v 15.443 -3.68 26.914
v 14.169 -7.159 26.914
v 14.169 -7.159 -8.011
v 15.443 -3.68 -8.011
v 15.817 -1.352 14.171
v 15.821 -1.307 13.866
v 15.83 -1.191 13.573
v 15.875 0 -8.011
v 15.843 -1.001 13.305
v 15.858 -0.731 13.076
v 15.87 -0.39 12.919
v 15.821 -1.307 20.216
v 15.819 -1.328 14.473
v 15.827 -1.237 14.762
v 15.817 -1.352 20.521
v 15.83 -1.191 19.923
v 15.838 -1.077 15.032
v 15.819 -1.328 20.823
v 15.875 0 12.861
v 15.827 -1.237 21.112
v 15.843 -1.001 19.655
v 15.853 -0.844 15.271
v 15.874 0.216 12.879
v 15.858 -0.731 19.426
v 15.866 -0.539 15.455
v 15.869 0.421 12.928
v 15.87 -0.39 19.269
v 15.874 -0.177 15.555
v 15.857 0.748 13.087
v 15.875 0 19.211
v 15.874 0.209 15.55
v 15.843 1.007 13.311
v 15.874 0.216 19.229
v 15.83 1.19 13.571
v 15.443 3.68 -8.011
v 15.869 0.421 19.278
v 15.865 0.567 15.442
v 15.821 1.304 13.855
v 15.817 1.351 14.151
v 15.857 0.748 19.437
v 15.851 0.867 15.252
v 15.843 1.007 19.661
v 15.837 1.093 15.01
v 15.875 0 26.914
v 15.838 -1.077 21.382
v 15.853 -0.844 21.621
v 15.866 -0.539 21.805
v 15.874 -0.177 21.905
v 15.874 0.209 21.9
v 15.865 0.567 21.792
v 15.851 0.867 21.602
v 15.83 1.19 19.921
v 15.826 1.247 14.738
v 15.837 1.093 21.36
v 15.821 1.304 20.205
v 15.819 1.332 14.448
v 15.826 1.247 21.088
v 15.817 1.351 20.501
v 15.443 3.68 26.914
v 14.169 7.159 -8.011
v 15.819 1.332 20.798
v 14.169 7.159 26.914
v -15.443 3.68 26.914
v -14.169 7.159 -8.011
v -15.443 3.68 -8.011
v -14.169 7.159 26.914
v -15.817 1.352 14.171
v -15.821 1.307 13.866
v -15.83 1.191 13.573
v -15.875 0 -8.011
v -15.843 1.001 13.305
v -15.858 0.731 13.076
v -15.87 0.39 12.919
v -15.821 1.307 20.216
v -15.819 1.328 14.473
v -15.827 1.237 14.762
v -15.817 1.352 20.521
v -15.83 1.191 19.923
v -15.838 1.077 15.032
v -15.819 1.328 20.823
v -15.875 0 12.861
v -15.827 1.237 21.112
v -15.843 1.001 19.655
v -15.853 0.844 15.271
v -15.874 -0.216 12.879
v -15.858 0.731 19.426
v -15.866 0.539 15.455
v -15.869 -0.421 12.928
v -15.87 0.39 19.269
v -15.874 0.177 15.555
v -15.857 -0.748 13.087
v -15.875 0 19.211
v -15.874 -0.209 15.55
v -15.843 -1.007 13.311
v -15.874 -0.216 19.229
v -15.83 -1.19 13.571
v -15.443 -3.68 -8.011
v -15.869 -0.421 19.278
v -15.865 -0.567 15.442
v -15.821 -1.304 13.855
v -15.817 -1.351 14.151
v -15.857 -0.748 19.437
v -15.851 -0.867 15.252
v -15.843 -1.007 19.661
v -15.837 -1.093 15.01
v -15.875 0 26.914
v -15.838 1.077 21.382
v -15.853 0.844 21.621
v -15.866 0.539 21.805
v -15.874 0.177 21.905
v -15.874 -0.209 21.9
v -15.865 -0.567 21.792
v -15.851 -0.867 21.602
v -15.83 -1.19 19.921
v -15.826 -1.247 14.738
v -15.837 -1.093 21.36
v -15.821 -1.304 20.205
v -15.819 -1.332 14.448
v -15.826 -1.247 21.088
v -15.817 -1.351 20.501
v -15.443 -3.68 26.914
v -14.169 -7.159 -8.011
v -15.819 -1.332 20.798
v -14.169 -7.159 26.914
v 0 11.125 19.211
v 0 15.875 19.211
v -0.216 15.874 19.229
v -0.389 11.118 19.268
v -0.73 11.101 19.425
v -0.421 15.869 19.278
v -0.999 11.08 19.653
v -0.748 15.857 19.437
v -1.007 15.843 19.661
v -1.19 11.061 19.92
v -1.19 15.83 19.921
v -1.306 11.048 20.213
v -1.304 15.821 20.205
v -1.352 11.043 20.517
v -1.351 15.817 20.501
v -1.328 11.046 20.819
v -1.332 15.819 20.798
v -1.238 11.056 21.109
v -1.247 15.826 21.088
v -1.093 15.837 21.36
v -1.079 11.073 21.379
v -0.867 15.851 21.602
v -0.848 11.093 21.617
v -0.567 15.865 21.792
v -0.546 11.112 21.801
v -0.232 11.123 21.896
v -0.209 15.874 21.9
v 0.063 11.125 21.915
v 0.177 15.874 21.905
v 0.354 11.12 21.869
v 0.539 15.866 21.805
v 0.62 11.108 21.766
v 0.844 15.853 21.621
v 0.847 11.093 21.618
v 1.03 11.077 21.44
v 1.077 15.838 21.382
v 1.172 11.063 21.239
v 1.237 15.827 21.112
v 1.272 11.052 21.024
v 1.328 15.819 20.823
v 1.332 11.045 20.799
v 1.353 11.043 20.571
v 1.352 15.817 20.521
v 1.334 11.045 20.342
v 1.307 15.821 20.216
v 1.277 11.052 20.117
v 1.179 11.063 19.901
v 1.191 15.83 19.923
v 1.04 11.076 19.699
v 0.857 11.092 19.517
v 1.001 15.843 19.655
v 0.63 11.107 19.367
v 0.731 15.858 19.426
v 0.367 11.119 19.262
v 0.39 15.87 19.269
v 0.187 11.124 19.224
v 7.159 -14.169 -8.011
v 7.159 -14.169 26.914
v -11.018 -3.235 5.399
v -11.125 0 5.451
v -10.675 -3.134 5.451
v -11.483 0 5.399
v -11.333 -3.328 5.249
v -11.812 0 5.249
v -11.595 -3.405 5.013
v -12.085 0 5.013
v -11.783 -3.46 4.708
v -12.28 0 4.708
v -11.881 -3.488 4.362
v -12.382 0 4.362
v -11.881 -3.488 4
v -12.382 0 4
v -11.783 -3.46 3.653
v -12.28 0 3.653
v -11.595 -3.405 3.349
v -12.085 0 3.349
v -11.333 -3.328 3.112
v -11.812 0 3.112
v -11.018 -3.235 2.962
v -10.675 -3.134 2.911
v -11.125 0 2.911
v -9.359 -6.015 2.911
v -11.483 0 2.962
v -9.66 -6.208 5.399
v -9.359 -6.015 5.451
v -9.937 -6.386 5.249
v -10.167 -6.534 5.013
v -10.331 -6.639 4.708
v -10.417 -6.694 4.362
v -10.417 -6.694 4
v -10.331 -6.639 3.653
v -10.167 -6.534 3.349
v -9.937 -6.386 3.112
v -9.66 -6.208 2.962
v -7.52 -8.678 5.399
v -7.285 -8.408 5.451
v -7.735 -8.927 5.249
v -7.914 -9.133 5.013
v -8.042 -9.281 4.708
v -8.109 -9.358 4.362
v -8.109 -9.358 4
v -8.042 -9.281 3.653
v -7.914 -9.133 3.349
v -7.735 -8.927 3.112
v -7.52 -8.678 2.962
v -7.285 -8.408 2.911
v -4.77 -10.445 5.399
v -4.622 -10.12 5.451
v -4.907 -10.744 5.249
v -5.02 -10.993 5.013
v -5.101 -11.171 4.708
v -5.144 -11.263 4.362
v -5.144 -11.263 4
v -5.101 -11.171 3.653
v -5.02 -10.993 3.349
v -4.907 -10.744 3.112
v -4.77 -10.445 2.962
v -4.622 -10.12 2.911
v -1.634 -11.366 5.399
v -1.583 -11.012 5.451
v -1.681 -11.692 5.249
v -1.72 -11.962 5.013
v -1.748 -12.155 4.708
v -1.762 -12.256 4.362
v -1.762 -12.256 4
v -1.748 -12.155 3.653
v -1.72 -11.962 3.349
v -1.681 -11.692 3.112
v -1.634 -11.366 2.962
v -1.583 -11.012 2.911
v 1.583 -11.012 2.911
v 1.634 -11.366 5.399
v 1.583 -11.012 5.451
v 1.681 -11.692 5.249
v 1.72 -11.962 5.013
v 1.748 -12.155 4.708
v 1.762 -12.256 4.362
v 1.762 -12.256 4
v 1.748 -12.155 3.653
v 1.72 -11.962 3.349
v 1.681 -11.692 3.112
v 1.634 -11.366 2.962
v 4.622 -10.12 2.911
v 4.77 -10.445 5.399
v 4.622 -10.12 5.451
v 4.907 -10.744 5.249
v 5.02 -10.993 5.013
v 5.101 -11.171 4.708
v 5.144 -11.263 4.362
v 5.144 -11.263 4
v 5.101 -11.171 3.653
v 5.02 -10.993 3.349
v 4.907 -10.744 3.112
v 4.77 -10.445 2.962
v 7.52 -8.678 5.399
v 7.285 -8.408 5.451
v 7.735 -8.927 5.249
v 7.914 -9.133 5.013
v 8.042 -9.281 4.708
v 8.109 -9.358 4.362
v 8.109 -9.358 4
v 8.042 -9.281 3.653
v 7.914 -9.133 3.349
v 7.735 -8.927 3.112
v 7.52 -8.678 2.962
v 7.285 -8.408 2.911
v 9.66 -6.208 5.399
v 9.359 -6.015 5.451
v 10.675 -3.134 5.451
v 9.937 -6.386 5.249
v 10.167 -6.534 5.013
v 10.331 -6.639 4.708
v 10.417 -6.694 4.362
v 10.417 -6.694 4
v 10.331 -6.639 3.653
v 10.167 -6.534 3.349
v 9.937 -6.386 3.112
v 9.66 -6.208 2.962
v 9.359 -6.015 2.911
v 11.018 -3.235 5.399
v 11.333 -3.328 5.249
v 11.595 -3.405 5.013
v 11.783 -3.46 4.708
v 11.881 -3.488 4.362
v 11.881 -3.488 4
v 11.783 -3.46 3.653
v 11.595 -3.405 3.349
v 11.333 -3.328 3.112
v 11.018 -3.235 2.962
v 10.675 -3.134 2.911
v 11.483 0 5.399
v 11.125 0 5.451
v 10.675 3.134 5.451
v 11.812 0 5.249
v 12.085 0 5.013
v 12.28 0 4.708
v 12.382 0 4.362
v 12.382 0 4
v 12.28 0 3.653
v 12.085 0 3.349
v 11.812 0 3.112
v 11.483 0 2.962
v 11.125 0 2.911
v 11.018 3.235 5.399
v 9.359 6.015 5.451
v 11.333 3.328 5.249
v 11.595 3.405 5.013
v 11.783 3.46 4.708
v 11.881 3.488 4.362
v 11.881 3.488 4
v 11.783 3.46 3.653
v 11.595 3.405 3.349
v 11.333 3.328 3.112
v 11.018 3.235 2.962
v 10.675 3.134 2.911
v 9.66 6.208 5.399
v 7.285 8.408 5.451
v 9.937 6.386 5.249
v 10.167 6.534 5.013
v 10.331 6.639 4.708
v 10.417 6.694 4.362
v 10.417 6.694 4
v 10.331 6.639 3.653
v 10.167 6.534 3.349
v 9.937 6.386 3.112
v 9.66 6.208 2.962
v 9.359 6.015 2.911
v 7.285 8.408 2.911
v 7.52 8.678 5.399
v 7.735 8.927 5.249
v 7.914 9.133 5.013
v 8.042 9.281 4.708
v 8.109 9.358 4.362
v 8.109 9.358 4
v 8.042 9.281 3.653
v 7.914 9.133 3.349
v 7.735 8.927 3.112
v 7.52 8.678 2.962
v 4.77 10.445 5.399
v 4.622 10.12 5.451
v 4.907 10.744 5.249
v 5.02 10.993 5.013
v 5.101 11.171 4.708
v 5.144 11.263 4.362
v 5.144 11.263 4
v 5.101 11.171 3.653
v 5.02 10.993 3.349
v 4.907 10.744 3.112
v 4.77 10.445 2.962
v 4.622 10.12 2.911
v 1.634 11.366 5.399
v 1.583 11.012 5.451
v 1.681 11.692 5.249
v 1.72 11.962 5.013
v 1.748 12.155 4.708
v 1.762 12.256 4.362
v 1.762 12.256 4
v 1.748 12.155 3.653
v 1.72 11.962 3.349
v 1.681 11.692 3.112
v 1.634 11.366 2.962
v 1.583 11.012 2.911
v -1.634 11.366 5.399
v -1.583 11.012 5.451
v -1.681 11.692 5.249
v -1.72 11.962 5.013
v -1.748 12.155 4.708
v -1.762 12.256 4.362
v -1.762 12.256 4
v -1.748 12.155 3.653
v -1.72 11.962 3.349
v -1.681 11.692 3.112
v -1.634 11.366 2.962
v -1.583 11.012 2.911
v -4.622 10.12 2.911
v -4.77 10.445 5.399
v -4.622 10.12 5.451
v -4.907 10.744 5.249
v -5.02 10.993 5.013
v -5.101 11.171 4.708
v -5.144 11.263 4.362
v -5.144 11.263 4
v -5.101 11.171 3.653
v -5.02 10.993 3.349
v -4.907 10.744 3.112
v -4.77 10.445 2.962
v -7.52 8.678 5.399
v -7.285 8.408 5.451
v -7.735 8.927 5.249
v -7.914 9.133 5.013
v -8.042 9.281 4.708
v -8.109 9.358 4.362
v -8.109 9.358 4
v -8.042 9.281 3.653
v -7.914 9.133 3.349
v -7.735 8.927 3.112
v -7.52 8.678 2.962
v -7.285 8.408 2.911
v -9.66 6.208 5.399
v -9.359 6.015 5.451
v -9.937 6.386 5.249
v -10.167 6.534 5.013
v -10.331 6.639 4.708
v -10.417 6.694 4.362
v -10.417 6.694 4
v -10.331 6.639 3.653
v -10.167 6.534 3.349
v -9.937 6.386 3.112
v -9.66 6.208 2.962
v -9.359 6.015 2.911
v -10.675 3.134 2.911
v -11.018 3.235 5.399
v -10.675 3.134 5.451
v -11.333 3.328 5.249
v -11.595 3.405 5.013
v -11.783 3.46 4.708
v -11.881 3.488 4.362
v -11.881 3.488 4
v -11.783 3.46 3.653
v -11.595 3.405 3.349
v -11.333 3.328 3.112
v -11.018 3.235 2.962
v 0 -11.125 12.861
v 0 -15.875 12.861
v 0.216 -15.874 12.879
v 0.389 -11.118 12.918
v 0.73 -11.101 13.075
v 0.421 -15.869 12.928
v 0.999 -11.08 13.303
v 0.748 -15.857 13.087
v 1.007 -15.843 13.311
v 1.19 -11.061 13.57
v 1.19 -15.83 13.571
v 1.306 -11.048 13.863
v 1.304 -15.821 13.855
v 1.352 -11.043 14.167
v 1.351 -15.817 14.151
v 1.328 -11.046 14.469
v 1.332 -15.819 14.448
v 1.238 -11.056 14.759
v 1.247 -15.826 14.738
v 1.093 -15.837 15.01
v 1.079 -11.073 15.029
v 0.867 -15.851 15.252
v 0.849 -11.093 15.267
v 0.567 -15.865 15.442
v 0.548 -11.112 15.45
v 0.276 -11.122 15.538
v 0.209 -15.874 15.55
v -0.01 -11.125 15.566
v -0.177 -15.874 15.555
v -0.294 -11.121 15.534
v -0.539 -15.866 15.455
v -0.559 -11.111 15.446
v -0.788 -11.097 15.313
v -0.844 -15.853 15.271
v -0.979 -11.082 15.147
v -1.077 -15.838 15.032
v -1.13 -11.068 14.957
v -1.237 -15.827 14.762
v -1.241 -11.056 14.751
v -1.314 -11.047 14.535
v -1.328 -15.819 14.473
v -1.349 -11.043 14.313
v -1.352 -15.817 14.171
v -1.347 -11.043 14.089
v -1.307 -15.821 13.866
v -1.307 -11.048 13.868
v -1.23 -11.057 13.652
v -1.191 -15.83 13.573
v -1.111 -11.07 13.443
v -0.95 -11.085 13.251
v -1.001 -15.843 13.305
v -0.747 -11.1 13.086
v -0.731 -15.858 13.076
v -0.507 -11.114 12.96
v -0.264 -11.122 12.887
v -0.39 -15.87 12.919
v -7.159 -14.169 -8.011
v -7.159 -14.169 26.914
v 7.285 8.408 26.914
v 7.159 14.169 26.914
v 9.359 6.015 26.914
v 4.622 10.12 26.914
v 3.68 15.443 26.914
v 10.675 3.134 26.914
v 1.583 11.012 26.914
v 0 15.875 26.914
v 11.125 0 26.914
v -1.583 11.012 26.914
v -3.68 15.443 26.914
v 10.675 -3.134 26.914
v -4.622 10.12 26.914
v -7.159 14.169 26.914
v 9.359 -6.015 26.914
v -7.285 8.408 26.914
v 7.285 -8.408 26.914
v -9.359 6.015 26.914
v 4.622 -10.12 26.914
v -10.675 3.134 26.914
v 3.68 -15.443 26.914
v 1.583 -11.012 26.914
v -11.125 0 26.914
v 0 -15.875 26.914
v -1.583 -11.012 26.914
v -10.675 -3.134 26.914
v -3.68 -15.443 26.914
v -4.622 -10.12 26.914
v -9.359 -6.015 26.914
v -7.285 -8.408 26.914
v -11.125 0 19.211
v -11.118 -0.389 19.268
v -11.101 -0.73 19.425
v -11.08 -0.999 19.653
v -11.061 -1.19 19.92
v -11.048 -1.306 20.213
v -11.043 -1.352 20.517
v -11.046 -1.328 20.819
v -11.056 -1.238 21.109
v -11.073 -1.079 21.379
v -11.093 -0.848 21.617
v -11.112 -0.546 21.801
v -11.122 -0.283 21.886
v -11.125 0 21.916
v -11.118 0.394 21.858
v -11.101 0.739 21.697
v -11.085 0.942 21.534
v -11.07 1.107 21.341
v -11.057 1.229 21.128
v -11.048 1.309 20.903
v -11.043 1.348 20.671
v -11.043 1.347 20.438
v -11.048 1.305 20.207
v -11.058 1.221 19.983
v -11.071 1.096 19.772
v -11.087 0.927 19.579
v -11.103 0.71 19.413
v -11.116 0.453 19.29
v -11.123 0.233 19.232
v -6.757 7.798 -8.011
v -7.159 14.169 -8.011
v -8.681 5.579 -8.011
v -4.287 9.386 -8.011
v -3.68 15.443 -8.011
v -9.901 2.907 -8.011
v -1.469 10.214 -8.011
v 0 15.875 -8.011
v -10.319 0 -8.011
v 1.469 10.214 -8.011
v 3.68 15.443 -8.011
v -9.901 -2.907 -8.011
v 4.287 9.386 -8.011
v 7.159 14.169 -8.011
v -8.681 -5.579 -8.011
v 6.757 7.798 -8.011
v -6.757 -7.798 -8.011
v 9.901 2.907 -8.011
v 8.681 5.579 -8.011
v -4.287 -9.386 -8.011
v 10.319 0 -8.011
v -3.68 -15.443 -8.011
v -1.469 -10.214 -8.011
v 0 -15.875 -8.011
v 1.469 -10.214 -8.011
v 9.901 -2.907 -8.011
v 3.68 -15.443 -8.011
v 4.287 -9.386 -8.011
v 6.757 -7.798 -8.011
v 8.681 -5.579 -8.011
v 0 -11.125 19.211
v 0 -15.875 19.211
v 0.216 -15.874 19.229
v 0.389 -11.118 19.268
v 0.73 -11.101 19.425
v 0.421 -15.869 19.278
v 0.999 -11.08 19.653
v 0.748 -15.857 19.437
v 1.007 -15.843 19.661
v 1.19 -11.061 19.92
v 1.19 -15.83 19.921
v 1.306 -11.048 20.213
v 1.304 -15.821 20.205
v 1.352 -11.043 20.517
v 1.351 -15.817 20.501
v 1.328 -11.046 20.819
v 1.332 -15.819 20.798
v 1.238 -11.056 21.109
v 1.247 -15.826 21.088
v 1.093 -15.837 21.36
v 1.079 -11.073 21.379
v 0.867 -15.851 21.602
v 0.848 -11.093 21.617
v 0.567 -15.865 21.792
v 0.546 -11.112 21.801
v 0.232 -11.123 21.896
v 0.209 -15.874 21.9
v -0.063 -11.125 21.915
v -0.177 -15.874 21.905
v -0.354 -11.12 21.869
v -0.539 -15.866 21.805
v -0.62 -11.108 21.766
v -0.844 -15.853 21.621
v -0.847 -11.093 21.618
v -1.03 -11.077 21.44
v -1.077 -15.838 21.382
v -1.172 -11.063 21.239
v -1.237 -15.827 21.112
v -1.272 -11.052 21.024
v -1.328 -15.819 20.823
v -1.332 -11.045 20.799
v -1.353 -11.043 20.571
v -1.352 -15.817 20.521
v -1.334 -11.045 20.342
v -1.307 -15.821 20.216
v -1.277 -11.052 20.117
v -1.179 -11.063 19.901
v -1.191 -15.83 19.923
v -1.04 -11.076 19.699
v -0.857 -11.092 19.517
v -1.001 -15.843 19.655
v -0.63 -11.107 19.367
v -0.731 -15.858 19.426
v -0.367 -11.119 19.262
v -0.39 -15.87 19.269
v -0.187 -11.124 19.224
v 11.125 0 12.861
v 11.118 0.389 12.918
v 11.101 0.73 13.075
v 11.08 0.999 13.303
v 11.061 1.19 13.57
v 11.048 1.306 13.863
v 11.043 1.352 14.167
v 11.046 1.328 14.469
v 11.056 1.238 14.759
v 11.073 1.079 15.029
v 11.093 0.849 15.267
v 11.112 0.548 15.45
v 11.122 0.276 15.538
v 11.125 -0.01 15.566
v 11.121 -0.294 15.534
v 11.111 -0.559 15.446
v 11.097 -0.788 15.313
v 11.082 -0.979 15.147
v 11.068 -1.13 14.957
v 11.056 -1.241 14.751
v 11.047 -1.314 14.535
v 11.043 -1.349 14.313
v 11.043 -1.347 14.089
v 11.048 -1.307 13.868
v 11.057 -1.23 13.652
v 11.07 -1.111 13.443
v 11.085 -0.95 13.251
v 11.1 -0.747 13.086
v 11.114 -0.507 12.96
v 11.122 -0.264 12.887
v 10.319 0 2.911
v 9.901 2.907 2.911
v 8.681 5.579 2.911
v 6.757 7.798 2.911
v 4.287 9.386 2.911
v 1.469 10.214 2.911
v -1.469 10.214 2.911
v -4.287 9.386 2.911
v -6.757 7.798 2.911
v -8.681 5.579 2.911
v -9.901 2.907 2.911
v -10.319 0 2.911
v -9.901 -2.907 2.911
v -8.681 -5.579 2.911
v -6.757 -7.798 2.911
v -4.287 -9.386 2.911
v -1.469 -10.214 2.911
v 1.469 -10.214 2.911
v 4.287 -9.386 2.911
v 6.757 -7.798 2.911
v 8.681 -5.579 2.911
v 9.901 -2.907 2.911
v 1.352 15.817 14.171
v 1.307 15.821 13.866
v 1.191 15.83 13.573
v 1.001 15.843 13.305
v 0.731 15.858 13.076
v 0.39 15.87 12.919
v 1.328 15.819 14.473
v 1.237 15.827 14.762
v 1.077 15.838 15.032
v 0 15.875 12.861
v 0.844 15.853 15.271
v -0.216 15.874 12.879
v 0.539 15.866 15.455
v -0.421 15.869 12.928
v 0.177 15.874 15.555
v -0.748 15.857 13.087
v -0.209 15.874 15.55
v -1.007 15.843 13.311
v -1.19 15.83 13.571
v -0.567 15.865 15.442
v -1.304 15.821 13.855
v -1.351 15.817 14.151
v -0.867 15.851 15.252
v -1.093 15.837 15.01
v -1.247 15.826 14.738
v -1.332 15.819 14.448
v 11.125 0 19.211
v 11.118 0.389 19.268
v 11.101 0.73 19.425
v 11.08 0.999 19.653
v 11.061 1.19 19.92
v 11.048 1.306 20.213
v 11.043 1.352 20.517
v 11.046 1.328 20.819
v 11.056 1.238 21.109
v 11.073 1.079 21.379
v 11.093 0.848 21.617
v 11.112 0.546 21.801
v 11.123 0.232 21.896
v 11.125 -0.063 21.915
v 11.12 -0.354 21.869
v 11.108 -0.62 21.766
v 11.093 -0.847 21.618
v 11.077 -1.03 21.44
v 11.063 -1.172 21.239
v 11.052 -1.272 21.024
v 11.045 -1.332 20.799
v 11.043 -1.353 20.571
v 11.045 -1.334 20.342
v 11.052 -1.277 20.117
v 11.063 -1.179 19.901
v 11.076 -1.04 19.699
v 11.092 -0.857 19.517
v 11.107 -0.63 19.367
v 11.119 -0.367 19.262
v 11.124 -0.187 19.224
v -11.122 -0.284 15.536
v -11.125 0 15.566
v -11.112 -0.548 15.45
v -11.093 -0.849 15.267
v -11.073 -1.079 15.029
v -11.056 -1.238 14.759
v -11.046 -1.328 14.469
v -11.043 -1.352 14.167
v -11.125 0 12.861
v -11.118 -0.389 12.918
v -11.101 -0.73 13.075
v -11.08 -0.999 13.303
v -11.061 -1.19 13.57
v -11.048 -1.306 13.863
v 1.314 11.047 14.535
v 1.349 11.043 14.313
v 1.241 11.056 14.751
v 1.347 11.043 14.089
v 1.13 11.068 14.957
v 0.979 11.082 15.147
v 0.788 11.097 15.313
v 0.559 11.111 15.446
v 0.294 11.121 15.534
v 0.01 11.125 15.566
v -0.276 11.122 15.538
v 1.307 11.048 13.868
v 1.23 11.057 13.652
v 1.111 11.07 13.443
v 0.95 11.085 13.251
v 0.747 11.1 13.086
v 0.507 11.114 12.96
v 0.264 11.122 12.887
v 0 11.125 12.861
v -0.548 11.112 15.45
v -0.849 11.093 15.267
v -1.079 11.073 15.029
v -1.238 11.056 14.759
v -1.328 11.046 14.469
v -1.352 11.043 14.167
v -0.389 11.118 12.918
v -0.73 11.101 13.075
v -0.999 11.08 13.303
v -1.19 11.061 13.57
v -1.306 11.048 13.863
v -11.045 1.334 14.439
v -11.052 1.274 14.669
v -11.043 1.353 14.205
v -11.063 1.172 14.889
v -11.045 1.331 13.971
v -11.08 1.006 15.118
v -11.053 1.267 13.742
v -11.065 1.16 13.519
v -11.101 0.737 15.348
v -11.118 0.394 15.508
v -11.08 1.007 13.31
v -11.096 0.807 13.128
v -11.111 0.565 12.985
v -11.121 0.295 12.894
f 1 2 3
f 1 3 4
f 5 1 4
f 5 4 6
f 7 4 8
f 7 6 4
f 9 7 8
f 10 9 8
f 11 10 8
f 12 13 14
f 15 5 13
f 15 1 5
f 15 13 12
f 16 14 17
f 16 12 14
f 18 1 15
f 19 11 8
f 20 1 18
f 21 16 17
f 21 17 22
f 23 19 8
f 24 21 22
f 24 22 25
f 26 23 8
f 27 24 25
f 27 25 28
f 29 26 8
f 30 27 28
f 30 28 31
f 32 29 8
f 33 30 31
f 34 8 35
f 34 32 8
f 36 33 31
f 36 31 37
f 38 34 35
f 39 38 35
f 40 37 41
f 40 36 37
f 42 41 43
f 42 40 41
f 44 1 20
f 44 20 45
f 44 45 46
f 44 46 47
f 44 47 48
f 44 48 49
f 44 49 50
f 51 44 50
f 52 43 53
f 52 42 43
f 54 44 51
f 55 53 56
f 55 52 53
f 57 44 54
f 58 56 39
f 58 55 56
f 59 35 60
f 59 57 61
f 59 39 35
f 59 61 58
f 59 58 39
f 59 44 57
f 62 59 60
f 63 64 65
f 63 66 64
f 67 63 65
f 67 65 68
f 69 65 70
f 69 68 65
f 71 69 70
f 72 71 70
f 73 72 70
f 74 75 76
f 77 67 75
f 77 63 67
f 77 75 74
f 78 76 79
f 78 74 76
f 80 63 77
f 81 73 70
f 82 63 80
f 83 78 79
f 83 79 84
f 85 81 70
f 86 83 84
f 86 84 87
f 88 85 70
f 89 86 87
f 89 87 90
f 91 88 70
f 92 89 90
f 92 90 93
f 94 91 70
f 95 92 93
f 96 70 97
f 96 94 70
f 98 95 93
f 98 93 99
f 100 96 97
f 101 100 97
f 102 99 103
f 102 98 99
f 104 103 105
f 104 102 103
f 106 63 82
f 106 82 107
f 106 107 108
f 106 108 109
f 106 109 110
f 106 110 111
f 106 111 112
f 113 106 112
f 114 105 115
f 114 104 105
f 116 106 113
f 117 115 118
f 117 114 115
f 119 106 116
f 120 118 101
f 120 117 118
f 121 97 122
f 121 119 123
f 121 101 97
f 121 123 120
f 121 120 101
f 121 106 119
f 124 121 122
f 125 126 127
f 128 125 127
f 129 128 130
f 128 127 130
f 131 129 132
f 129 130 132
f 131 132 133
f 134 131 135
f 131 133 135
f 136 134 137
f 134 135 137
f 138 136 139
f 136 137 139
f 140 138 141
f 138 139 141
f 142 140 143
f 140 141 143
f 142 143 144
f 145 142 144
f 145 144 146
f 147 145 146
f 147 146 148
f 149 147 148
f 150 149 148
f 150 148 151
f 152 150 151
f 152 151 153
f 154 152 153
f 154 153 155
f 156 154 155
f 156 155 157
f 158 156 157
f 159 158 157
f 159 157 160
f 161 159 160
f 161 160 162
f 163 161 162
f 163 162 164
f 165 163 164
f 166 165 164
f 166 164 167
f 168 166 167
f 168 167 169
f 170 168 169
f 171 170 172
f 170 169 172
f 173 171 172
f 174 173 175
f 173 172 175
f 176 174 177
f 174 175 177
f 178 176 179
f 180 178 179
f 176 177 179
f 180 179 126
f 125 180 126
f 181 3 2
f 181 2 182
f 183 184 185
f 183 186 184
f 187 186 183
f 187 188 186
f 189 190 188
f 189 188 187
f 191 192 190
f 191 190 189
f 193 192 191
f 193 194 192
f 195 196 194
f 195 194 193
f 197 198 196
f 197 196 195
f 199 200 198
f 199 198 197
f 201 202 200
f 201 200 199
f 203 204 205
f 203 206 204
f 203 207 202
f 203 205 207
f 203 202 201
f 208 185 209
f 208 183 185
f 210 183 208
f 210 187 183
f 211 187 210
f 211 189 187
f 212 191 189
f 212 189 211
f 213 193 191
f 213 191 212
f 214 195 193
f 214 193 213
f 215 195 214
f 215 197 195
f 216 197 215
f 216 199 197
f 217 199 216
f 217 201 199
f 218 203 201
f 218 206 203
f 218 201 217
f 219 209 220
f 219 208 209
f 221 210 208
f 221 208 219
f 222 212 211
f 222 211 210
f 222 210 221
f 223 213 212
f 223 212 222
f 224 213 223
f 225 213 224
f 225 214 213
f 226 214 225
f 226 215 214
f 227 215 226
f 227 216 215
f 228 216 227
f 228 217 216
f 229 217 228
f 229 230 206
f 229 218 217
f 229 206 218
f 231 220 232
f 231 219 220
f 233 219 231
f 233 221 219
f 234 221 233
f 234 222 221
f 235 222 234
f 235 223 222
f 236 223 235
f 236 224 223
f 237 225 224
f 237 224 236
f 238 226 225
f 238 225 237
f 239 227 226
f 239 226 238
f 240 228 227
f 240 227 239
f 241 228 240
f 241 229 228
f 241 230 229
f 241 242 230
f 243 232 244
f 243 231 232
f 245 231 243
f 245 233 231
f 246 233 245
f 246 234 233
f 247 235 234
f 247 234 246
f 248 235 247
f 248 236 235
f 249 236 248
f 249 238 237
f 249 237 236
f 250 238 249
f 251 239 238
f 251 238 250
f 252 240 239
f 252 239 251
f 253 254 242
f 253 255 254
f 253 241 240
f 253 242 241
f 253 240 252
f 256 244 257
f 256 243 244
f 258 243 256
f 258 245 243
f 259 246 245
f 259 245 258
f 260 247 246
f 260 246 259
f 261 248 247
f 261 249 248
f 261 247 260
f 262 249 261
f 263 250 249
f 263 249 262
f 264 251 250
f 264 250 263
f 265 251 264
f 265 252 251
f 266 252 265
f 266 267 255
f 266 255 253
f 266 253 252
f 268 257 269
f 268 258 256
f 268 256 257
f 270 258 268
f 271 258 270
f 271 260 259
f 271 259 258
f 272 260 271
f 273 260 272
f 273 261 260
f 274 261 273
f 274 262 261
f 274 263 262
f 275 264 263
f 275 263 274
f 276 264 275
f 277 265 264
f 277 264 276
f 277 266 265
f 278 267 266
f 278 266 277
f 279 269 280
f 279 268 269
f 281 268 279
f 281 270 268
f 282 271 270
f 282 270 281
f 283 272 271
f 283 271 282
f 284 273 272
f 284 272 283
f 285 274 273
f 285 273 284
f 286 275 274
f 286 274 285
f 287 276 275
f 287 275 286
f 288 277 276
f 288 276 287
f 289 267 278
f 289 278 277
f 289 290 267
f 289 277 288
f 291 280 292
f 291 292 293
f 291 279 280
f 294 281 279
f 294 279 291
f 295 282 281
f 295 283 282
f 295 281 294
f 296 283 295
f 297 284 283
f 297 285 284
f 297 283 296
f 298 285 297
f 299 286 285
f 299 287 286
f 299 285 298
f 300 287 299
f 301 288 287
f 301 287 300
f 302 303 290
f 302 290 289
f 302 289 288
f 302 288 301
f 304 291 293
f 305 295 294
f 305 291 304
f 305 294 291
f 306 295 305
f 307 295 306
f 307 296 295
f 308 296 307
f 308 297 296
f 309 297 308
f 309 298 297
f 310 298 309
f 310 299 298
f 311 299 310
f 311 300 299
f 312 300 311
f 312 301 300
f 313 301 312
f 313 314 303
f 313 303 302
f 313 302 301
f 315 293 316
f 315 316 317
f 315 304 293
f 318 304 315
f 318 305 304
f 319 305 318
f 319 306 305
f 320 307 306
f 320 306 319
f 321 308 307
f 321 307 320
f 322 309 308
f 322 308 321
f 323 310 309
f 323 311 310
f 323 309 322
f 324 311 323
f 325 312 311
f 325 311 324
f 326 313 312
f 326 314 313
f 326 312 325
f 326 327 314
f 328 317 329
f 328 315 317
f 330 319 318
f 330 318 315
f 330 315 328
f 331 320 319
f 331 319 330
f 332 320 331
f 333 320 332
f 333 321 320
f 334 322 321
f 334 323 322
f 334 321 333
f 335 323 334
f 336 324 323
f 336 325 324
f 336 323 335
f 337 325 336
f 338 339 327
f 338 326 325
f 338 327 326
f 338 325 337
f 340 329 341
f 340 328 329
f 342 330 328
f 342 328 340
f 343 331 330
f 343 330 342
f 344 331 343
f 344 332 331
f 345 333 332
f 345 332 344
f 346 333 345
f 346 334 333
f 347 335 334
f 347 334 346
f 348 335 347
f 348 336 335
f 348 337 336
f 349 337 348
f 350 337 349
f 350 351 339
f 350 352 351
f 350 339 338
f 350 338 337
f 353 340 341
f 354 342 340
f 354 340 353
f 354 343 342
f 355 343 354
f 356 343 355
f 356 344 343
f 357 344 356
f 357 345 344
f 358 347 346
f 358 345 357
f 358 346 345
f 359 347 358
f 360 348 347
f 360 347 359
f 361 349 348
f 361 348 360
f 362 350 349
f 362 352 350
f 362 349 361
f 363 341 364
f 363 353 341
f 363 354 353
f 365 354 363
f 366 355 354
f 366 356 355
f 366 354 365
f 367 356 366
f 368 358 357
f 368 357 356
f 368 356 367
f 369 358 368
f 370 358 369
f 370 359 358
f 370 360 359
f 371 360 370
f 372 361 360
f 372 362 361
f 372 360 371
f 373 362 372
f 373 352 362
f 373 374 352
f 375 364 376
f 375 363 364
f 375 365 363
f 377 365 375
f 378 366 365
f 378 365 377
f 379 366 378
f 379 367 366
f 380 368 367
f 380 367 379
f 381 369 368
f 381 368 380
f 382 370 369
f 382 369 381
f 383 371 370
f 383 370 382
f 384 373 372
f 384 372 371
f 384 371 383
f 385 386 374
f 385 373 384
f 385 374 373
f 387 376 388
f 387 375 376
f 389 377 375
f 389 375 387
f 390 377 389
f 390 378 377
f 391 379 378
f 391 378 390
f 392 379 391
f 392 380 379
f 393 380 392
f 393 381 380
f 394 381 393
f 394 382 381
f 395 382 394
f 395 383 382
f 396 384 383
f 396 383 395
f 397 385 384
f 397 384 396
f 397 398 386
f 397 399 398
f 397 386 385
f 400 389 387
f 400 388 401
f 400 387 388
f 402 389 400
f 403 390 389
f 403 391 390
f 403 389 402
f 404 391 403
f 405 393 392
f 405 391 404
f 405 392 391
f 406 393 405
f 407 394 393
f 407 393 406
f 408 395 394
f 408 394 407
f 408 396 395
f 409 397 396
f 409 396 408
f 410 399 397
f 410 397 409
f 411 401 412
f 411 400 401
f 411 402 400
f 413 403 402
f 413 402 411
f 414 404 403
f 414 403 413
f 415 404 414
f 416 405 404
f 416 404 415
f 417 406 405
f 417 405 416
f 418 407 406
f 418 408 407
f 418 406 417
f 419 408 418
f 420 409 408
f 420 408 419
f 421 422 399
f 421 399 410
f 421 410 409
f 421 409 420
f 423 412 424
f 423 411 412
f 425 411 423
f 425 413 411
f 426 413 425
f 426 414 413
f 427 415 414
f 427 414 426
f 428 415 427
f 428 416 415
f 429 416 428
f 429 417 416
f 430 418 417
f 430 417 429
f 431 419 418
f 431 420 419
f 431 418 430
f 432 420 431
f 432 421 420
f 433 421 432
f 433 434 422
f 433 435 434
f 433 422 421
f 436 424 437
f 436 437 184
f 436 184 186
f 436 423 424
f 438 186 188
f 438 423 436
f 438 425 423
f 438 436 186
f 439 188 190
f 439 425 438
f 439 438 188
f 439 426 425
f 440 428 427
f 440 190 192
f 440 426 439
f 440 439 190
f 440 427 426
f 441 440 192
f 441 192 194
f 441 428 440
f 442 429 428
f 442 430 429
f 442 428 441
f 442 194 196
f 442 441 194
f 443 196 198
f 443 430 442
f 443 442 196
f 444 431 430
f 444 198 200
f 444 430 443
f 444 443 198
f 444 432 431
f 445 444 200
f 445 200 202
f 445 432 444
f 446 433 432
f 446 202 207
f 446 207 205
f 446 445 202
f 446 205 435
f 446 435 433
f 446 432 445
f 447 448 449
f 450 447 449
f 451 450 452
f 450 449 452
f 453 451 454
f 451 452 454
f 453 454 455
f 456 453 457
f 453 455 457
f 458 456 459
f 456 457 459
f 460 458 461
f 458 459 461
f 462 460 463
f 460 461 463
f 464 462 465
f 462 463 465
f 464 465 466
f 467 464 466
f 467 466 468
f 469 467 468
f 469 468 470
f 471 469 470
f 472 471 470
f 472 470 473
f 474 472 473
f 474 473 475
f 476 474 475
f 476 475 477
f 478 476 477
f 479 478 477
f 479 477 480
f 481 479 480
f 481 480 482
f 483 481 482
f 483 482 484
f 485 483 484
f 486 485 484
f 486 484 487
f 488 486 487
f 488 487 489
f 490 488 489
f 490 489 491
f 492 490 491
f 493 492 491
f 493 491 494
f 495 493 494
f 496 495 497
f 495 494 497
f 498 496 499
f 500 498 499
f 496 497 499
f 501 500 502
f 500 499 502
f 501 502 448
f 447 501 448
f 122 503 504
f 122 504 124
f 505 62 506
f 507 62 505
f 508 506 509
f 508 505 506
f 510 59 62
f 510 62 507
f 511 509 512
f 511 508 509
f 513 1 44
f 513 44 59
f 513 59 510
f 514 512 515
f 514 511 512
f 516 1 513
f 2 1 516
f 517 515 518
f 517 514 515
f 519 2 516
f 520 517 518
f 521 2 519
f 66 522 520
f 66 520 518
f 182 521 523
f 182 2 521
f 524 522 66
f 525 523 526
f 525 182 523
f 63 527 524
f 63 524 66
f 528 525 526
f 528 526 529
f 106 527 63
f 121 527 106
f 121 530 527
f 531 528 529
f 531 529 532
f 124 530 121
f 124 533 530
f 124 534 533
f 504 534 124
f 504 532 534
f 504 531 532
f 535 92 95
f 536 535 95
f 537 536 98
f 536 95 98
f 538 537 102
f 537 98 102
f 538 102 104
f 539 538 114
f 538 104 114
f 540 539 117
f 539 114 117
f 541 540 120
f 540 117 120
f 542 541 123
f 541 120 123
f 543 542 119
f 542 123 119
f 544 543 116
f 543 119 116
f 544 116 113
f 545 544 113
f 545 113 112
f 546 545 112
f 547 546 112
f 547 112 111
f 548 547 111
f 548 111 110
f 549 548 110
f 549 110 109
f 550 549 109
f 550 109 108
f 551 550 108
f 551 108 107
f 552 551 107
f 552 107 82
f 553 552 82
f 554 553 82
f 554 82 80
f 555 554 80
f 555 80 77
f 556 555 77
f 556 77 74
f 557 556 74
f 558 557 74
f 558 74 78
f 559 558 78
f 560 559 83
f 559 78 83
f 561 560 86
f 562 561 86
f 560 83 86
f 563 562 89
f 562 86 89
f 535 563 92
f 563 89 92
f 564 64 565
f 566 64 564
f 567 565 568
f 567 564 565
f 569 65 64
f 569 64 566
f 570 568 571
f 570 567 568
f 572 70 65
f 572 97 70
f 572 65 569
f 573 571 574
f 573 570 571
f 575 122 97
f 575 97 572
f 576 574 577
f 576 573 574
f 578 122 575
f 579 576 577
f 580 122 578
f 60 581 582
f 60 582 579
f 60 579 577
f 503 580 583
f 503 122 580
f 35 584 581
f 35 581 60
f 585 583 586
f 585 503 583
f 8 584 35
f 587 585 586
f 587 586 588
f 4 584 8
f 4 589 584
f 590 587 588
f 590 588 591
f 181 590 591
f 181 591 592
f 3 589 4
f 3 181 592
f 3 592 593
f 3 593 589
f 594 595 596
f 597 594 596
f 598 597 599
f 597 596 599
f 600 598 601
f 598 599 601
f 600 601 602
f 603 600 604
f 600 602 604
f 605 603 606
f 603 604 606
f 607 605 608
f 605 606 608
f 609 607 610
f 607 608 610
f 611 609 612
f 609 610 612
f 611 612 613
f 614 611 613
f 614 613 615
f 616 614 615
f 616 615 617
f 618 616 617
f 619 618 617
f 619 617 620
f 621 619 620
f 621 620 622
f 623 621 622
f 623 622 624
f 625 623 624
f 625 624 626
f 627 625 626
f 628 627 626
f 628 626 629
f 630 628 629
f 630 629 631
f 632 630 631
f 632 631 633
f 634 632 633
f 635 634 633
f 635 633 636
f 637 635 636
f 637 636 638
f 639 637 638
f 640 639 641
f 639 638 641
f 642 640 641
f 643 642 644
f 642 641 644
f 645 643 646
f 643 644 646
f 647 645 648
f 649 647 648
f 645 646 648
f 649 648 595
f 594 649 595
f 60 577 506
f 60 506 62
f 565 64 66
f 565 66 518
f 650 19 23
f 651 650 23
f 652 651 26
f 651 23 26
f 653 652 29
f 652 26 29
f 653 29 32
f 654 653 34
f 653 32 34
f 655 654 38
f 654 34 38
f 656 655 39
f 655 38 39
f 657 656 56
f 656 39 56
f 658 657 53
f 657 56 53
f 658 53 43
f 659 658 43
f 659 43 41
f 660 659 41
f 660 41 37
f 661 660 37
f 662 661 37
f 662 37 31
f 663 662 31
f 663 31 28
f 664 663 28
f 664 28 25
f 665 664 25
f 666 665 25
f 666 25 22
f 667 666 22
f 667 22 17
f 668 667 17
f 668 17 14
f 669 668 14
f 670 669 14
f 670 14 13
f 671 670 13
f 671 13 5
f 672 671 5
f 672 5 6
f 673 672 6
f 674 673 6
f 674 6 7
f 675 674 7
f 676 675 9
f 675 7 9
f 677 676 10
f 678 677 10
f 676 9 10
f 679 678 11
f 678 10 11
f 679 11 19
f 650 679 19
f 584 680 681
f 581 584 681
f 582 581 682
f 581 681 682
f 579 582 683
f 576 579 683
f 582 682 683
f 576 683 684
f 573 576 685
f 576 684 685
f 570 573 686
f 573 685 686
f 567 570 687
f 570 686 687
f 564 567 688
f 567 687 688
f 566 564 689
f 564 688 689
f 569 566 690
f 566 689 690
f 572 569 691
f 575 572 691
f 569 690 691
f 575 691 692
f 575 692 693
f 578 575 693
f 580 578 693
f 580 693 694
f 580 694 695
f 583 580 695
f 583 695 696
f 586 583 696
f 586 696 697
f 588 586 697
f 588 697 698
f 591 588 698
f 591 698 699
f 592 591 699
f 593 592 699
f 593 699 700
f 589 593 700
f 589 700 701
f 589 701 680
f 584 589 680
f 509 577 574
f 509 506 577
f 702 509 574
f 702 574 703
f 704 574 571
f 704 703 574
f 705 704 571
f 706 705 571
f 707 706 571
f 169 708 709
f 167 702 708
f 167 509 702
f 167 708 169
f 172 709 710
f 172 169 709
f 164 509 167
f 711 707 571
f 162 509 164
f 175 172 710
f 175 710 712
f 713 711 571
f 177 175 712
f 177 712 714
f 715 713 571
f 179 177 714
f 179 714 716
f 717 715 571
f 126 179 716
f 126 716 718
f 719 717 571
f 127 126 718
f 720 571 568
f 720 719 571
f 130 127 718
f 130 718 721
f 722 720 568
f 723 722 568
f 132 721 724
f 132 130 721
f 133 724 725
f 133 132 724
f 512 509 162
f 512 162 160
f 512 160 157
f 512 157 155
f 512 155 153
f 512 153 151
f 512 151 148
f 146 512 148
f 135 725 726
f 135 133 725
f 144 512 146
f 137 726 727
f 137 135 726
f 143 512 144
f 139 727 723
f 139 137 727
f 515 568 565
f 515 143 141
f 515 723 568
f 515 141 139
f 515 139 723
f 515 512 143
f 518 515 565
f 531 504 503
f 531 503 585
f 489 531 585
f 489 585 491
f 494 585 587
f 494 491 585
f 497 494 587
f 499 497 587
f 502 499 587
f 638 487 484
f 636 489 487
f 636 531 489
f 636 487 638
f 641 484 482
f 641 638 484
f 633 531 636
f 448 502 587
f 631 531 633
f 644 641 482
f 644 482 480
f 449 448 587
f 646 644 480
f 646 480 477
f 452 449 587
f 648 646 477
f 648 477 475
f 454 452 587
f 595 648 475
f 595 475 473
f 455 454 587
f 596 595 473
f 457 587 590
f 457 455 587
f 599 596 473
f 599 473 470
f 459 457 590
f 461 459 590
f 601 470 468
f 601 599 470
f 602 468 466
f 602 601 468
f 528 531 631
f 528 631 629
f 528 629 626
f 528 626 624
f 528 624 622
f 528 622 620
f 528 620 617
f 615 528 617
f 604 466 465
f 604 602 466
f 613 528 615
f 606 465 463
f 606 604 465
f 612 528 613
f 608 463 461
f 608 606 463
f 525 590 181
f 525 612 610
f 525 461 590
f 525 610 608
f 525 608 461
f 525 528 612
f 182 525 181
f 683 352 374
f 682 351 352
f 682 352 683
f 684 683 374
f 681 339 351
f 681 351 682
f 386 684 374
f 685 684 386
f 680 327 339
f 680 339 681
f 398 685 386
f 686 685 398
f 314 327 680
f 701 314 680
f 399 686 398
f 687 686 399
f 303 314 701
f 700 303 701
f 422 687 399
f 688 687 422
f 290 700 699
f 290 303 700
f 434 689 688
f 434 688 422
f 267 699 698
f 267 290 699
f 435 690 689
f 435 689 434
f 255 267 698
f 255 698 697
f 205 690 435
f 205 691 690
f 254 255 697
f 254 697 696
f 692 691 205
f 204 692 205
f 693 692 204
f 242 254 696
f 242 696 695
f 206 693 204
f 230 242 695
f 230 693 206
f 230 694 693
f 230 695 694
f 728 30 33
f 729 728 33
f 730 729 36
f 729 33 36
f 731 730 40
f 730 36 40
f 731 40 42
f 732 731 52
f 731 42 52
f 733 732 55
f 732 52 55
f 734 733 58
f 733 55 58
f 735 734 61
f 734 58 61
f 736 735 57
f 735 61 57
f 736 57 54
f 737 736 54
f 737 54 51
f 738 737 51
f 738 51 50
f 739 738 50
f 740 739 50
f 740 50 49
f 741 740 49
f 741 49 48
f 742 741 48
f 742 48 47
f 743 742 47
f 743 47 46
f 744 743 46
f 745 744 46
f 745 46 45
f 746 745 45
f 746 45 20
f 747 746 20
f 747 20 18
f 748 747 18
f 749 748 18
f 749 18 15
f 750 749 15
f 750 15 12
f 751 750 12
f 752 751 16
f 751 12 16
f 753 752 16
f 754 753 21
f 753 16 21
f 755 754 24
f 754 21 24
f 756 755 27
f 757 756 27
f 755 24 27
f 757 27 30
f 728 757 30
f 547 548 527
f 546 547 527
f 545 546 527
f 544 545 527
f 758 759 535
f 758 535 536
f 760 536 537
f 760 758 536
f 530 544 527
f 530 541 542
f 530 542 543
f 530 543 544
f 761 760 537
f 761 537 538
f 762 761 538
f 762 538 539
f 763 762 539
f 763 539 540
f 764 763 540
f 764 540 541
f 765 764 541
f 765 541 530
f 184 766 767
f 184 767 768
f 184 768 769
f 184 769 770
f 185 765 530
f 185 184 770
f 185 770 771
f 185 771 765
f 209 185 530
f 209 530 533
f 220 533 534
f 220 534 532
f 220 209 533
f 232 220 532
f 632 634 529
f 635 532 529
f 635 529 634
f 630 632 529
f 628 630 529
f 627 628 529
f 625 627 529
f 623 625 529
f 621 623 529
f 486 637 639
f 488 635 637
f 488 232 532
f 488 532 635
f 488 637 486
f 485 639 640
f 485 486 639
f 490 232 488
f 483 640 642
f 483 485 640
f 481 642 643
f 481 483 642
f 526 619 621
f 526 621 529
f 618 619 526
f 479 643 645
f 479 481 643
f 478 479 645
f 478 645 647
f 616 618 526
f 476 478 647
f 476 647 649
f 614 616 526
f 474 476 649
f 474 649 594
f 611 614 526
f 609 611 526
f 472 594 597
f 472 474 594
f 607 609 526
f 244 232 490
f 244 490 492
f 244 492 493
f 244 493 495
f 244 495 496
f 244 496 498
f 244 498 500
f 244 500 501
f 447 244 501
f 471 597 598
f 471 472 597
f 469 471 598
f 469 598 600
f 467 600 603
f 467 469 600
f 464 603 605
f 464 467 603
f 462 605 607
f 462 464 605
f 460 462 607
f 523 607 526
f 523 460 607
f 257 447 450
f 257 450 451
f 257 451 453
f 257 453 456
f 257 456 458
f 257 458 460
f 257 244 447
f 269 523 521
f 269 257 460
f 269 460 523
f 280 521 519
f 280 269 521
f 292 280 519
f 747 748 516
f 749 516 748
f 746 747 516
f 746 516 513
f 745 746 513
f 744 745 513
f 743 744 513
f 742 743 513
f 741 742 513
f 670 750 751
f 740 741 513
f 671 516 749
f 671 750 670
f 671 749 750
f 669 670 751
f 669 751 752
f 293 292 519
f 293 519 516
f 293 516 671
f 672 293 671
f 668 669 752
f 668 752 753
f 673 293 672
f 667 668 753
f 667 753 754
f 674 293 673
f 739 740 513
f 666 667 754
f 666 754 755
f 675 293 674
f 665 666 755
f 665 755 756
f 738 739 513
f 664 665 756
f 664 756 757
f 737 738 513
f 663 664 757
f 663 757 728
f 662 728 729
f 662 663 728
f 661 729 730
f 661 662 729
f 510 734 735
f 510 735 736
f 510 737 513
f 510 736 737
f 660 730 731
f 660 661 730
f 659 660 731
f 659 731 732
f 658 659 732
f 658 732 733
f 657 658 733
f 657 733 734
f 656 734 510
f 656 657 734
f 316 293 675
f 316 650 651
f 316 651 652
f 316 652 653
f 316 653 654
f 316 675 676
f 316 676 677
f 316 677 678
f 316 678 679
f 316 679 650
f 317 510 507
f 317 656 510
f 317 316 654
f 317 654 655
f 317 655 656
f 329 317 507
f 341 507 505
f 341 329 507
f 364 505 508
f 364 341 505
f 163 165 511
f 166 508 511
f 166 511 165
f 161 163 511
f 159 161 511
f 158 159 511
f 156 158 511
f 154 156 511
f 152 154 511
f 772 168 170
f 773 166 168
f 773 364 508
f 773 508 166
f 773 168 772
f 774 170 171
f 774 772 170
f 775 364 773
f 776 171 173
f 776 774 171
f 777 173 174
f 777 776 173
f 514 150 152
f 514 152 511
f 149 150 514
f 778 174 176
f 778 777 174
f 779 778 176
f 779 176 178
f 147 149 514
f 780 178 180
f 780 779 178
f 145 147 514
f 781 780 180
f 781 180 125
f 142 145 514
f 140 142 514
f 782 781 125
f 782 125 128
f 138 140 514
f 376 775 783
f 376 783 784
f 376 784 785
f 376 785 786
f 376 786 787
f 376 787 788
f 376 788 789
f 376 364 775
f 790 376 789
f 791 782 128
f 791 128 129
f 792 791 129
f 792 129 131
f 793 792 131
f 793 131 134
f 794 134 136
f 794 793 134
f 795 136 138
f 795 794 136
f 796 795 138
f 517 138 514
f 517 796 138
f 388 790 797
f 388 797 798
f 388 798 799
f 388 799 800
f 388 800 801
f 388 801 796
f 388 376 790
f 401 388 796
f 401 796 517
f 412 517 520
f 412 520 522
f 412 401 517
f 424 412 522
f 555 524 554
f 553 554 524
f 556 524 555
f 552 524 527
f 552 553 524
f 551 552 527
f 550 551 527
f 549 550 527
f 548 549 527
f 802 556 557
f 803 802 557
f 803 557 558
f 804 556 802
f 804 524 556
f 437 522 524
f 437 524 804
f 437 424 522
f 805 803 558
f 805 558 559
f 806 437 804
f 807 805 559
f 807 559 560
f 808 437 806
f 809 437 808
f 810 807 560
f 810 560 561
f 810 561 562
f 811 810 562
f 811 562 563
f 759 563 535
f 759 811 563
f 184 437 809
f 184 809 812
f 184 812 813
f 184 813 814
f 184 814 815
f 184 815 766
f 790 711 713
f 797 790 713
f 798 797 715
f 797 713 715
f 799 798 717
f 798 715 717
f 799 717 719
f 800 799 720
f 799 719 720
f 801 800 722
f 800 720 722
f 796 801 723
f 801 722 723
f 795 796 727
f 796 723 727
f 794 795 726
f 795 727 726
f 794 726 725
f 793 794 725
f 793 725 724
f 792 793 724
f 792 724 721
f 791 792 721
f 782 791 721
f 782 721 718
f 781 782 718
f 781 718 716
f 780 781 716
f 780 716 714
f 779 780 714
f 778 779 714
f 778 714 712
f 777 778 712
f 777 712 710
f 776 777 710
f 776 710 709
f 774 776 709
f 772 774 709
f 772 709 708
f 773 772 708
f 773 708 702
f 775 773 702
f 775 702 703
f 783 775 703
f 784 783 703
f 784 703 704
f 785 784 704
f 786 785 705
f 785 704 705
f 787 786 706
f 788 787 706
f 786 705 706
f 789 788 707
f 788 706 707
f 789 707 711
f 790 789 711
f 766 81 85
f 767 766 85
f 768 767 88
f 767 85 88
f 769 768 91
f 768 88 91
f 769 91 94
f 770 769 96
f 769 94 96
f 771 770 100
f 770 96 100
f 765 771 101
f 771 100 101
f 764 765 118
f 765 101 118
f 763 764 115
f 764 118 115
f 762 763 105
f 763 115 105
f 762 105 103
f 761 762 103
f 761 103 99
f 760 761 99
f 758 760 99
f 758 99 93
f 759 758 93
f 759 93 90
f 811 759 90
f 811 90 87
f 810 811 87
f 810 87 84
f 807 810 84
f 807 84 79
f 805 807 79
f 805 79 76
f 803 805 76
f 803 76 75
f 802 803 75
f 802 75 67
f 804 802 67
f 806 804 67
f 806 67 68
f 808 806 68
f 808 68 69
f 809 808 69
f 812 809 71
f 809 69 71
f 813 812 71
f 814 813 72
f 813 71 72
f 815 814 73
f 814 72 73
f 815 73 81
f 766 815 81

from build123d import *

# Parameters (mm, degrees)
SKETCH2_OUTSIDE_W          = 45.126
SKETCH2_OUTSIDE_H          = 45.126
CUT_EXTRUDE1_DEPTH         = 42.518512437
F_6_32_TAPPED_HOLE1_REACH  = 46.547
F_6_32_TAPPED_HOLE1_BORE_R = 1.35255
CIRPATTERN1_COUNT          = 4
F_7_8_14_TAPPED_HOLE1_D    = 20.6375


with BuildPart() as part:
    # Sketch1 → Revolve1 (revolve)
    with BuildSketch(Plane(origin=(0, 0, 0), x_dir=(0, 0, -1), z_dir=(1, 0, 0)), mode=Mode.PRIVATE) as revolve1_sk:
        with BuildLine():
            Line((-26.913863801, 11.1252), (-5.450863801, 11.1252))
            ThreePointArc((-5.450863801, 11.1252), (-4.180863801, 12.3952), (-2.910863801, 11.1252))
            Line((-2.910863801, 11.1252), (-2.910863801, 9.9695))
            Line((-2.910863801, 9.9695), (8.011136199, 9.9695))
            Line((8.011136199, 9.9695), (8.011136199, 15.875))
            Line((8.011136199, 15.875), (-26.913863801, 15.875))
            Line((-26.913863801, 15.875), (-26.913863801, 11.1252))
        make_face()
    revolve(revolve1_sk.sketch.rotate(Axis((0, 0, 0), (0, 0, 1)), 90), axis=Axis((0, 0, 0), (0, 0, 1)))

    # Sketch2 outside → Cut-Extrude1 (cut, through all)
    with BuildSketch(Plane.XY.offset(26.913863801)):
        Rectangle(SKETCH2_OUTSIDE_W, SKETCH2_OUTSIDE_H)
        Polygon((0, -21.328108288), (-21.328108288, 0), (0, 21.328108288), (21.328108288, 0), align=None, mode=Mode.SUBTRACT)
    extrude(amount=-CUT_EXTRUDE1_DEPTH, mode=Mode.SUBTRACT)

    # 6-32 Tapped Hole1 bore → 6-32 Tapped Hole1 (cut, up to next)
    with BuildSketch(Plane(origin=(15.875, 0, 0), x_dir=(0, 0, -1), z_dir=(1, 0, 0)), mode=Mode.PRIVATE) as f_6_32_tapped_hole1_sk1:
        with Locations((-20.563863801, 0)):
            Circle(F_6_32_TAPPED_HOLE1_BORE_R)
    f_6_32_tapped_hole1_tool1 = extrude(f_6_32_tapped_hole1_sk1.sketch, amount=-F_6_32_TAPPED_HOLE1_REACH, mode=Mode.PRIVATE) & part.part
    # 6-32 Tapped Hole1 bore → 6-32 Tapped Hole1 (cut, up to next)
    with BuildSketch(Plane(origin=(15.875, 0, 0), x_dir=(0, 0, -1), z_dir=(1, 0, 0)), mode=Mode.PRIVATE) as f_6_32_tapped_hole1_sk2:
        with Locations((-14.213863801, 0)):
            Circle(F_6_32_TAPPED_HOLE1_BORE_R)
    f_6_32_tapped_hole1_tool2 = extrude(f_6_32_tapped_hole1_sk2.sketch, amount=-F_6_32_TAPPED_HOLE1_REACH, mode=Mode.PRIVATE) & part.part
    f_6_32_tapped_hole1_1 = f_6_32_tapped_hole1_tool1.solids().sort_by_distance((15.875, 0, 20.563864))[0]
    add(f_6_32_tapped_hole1_1, mode=Mode.SUBTRACT)
    f_6_32_tapped_hole1_2 = f_6_32_tapped_hole1_tool2.solids().sort_by_distance((15.875, 0, 14.213864))[0]
    add(f_6_32_tapped_hole1_2, mode=Mode.SUBTRACT)
    f_6_32_tapped_hole1 = f_6_32_tapped_hole1_1 + f_6_32_tapped_hole1_2  # 6-32 Tapped Hole1 as one shape, for the pattern or mirror that repeats it

    # CirPattern1: 6-32 Tapped Hole1 ×4 about axis
    cirpattern1_axis = Axis((0, 0, 0), (0, 0, -1))
    for i in range(1, CIRPATTERN1_COUNT):
        add(f_6_32_tapped_hole1.rotate(cirpattern1_axis, i * 360 / CIRPATTERN1_COUNT), mode=Mode.SUBTRACT)

    # 7_8-14 Tapped Hole1 (through all)
    with Locations(Plane(origin=(0, 0, -8.011136199), x_dir=(-1, 0, 0), z_dir=(0, 0, -1))):
        with Locations((0, 0)):
            Hole(F_7_8_14_TAPPED_HOLE1_D / 2)


solid = part.part
